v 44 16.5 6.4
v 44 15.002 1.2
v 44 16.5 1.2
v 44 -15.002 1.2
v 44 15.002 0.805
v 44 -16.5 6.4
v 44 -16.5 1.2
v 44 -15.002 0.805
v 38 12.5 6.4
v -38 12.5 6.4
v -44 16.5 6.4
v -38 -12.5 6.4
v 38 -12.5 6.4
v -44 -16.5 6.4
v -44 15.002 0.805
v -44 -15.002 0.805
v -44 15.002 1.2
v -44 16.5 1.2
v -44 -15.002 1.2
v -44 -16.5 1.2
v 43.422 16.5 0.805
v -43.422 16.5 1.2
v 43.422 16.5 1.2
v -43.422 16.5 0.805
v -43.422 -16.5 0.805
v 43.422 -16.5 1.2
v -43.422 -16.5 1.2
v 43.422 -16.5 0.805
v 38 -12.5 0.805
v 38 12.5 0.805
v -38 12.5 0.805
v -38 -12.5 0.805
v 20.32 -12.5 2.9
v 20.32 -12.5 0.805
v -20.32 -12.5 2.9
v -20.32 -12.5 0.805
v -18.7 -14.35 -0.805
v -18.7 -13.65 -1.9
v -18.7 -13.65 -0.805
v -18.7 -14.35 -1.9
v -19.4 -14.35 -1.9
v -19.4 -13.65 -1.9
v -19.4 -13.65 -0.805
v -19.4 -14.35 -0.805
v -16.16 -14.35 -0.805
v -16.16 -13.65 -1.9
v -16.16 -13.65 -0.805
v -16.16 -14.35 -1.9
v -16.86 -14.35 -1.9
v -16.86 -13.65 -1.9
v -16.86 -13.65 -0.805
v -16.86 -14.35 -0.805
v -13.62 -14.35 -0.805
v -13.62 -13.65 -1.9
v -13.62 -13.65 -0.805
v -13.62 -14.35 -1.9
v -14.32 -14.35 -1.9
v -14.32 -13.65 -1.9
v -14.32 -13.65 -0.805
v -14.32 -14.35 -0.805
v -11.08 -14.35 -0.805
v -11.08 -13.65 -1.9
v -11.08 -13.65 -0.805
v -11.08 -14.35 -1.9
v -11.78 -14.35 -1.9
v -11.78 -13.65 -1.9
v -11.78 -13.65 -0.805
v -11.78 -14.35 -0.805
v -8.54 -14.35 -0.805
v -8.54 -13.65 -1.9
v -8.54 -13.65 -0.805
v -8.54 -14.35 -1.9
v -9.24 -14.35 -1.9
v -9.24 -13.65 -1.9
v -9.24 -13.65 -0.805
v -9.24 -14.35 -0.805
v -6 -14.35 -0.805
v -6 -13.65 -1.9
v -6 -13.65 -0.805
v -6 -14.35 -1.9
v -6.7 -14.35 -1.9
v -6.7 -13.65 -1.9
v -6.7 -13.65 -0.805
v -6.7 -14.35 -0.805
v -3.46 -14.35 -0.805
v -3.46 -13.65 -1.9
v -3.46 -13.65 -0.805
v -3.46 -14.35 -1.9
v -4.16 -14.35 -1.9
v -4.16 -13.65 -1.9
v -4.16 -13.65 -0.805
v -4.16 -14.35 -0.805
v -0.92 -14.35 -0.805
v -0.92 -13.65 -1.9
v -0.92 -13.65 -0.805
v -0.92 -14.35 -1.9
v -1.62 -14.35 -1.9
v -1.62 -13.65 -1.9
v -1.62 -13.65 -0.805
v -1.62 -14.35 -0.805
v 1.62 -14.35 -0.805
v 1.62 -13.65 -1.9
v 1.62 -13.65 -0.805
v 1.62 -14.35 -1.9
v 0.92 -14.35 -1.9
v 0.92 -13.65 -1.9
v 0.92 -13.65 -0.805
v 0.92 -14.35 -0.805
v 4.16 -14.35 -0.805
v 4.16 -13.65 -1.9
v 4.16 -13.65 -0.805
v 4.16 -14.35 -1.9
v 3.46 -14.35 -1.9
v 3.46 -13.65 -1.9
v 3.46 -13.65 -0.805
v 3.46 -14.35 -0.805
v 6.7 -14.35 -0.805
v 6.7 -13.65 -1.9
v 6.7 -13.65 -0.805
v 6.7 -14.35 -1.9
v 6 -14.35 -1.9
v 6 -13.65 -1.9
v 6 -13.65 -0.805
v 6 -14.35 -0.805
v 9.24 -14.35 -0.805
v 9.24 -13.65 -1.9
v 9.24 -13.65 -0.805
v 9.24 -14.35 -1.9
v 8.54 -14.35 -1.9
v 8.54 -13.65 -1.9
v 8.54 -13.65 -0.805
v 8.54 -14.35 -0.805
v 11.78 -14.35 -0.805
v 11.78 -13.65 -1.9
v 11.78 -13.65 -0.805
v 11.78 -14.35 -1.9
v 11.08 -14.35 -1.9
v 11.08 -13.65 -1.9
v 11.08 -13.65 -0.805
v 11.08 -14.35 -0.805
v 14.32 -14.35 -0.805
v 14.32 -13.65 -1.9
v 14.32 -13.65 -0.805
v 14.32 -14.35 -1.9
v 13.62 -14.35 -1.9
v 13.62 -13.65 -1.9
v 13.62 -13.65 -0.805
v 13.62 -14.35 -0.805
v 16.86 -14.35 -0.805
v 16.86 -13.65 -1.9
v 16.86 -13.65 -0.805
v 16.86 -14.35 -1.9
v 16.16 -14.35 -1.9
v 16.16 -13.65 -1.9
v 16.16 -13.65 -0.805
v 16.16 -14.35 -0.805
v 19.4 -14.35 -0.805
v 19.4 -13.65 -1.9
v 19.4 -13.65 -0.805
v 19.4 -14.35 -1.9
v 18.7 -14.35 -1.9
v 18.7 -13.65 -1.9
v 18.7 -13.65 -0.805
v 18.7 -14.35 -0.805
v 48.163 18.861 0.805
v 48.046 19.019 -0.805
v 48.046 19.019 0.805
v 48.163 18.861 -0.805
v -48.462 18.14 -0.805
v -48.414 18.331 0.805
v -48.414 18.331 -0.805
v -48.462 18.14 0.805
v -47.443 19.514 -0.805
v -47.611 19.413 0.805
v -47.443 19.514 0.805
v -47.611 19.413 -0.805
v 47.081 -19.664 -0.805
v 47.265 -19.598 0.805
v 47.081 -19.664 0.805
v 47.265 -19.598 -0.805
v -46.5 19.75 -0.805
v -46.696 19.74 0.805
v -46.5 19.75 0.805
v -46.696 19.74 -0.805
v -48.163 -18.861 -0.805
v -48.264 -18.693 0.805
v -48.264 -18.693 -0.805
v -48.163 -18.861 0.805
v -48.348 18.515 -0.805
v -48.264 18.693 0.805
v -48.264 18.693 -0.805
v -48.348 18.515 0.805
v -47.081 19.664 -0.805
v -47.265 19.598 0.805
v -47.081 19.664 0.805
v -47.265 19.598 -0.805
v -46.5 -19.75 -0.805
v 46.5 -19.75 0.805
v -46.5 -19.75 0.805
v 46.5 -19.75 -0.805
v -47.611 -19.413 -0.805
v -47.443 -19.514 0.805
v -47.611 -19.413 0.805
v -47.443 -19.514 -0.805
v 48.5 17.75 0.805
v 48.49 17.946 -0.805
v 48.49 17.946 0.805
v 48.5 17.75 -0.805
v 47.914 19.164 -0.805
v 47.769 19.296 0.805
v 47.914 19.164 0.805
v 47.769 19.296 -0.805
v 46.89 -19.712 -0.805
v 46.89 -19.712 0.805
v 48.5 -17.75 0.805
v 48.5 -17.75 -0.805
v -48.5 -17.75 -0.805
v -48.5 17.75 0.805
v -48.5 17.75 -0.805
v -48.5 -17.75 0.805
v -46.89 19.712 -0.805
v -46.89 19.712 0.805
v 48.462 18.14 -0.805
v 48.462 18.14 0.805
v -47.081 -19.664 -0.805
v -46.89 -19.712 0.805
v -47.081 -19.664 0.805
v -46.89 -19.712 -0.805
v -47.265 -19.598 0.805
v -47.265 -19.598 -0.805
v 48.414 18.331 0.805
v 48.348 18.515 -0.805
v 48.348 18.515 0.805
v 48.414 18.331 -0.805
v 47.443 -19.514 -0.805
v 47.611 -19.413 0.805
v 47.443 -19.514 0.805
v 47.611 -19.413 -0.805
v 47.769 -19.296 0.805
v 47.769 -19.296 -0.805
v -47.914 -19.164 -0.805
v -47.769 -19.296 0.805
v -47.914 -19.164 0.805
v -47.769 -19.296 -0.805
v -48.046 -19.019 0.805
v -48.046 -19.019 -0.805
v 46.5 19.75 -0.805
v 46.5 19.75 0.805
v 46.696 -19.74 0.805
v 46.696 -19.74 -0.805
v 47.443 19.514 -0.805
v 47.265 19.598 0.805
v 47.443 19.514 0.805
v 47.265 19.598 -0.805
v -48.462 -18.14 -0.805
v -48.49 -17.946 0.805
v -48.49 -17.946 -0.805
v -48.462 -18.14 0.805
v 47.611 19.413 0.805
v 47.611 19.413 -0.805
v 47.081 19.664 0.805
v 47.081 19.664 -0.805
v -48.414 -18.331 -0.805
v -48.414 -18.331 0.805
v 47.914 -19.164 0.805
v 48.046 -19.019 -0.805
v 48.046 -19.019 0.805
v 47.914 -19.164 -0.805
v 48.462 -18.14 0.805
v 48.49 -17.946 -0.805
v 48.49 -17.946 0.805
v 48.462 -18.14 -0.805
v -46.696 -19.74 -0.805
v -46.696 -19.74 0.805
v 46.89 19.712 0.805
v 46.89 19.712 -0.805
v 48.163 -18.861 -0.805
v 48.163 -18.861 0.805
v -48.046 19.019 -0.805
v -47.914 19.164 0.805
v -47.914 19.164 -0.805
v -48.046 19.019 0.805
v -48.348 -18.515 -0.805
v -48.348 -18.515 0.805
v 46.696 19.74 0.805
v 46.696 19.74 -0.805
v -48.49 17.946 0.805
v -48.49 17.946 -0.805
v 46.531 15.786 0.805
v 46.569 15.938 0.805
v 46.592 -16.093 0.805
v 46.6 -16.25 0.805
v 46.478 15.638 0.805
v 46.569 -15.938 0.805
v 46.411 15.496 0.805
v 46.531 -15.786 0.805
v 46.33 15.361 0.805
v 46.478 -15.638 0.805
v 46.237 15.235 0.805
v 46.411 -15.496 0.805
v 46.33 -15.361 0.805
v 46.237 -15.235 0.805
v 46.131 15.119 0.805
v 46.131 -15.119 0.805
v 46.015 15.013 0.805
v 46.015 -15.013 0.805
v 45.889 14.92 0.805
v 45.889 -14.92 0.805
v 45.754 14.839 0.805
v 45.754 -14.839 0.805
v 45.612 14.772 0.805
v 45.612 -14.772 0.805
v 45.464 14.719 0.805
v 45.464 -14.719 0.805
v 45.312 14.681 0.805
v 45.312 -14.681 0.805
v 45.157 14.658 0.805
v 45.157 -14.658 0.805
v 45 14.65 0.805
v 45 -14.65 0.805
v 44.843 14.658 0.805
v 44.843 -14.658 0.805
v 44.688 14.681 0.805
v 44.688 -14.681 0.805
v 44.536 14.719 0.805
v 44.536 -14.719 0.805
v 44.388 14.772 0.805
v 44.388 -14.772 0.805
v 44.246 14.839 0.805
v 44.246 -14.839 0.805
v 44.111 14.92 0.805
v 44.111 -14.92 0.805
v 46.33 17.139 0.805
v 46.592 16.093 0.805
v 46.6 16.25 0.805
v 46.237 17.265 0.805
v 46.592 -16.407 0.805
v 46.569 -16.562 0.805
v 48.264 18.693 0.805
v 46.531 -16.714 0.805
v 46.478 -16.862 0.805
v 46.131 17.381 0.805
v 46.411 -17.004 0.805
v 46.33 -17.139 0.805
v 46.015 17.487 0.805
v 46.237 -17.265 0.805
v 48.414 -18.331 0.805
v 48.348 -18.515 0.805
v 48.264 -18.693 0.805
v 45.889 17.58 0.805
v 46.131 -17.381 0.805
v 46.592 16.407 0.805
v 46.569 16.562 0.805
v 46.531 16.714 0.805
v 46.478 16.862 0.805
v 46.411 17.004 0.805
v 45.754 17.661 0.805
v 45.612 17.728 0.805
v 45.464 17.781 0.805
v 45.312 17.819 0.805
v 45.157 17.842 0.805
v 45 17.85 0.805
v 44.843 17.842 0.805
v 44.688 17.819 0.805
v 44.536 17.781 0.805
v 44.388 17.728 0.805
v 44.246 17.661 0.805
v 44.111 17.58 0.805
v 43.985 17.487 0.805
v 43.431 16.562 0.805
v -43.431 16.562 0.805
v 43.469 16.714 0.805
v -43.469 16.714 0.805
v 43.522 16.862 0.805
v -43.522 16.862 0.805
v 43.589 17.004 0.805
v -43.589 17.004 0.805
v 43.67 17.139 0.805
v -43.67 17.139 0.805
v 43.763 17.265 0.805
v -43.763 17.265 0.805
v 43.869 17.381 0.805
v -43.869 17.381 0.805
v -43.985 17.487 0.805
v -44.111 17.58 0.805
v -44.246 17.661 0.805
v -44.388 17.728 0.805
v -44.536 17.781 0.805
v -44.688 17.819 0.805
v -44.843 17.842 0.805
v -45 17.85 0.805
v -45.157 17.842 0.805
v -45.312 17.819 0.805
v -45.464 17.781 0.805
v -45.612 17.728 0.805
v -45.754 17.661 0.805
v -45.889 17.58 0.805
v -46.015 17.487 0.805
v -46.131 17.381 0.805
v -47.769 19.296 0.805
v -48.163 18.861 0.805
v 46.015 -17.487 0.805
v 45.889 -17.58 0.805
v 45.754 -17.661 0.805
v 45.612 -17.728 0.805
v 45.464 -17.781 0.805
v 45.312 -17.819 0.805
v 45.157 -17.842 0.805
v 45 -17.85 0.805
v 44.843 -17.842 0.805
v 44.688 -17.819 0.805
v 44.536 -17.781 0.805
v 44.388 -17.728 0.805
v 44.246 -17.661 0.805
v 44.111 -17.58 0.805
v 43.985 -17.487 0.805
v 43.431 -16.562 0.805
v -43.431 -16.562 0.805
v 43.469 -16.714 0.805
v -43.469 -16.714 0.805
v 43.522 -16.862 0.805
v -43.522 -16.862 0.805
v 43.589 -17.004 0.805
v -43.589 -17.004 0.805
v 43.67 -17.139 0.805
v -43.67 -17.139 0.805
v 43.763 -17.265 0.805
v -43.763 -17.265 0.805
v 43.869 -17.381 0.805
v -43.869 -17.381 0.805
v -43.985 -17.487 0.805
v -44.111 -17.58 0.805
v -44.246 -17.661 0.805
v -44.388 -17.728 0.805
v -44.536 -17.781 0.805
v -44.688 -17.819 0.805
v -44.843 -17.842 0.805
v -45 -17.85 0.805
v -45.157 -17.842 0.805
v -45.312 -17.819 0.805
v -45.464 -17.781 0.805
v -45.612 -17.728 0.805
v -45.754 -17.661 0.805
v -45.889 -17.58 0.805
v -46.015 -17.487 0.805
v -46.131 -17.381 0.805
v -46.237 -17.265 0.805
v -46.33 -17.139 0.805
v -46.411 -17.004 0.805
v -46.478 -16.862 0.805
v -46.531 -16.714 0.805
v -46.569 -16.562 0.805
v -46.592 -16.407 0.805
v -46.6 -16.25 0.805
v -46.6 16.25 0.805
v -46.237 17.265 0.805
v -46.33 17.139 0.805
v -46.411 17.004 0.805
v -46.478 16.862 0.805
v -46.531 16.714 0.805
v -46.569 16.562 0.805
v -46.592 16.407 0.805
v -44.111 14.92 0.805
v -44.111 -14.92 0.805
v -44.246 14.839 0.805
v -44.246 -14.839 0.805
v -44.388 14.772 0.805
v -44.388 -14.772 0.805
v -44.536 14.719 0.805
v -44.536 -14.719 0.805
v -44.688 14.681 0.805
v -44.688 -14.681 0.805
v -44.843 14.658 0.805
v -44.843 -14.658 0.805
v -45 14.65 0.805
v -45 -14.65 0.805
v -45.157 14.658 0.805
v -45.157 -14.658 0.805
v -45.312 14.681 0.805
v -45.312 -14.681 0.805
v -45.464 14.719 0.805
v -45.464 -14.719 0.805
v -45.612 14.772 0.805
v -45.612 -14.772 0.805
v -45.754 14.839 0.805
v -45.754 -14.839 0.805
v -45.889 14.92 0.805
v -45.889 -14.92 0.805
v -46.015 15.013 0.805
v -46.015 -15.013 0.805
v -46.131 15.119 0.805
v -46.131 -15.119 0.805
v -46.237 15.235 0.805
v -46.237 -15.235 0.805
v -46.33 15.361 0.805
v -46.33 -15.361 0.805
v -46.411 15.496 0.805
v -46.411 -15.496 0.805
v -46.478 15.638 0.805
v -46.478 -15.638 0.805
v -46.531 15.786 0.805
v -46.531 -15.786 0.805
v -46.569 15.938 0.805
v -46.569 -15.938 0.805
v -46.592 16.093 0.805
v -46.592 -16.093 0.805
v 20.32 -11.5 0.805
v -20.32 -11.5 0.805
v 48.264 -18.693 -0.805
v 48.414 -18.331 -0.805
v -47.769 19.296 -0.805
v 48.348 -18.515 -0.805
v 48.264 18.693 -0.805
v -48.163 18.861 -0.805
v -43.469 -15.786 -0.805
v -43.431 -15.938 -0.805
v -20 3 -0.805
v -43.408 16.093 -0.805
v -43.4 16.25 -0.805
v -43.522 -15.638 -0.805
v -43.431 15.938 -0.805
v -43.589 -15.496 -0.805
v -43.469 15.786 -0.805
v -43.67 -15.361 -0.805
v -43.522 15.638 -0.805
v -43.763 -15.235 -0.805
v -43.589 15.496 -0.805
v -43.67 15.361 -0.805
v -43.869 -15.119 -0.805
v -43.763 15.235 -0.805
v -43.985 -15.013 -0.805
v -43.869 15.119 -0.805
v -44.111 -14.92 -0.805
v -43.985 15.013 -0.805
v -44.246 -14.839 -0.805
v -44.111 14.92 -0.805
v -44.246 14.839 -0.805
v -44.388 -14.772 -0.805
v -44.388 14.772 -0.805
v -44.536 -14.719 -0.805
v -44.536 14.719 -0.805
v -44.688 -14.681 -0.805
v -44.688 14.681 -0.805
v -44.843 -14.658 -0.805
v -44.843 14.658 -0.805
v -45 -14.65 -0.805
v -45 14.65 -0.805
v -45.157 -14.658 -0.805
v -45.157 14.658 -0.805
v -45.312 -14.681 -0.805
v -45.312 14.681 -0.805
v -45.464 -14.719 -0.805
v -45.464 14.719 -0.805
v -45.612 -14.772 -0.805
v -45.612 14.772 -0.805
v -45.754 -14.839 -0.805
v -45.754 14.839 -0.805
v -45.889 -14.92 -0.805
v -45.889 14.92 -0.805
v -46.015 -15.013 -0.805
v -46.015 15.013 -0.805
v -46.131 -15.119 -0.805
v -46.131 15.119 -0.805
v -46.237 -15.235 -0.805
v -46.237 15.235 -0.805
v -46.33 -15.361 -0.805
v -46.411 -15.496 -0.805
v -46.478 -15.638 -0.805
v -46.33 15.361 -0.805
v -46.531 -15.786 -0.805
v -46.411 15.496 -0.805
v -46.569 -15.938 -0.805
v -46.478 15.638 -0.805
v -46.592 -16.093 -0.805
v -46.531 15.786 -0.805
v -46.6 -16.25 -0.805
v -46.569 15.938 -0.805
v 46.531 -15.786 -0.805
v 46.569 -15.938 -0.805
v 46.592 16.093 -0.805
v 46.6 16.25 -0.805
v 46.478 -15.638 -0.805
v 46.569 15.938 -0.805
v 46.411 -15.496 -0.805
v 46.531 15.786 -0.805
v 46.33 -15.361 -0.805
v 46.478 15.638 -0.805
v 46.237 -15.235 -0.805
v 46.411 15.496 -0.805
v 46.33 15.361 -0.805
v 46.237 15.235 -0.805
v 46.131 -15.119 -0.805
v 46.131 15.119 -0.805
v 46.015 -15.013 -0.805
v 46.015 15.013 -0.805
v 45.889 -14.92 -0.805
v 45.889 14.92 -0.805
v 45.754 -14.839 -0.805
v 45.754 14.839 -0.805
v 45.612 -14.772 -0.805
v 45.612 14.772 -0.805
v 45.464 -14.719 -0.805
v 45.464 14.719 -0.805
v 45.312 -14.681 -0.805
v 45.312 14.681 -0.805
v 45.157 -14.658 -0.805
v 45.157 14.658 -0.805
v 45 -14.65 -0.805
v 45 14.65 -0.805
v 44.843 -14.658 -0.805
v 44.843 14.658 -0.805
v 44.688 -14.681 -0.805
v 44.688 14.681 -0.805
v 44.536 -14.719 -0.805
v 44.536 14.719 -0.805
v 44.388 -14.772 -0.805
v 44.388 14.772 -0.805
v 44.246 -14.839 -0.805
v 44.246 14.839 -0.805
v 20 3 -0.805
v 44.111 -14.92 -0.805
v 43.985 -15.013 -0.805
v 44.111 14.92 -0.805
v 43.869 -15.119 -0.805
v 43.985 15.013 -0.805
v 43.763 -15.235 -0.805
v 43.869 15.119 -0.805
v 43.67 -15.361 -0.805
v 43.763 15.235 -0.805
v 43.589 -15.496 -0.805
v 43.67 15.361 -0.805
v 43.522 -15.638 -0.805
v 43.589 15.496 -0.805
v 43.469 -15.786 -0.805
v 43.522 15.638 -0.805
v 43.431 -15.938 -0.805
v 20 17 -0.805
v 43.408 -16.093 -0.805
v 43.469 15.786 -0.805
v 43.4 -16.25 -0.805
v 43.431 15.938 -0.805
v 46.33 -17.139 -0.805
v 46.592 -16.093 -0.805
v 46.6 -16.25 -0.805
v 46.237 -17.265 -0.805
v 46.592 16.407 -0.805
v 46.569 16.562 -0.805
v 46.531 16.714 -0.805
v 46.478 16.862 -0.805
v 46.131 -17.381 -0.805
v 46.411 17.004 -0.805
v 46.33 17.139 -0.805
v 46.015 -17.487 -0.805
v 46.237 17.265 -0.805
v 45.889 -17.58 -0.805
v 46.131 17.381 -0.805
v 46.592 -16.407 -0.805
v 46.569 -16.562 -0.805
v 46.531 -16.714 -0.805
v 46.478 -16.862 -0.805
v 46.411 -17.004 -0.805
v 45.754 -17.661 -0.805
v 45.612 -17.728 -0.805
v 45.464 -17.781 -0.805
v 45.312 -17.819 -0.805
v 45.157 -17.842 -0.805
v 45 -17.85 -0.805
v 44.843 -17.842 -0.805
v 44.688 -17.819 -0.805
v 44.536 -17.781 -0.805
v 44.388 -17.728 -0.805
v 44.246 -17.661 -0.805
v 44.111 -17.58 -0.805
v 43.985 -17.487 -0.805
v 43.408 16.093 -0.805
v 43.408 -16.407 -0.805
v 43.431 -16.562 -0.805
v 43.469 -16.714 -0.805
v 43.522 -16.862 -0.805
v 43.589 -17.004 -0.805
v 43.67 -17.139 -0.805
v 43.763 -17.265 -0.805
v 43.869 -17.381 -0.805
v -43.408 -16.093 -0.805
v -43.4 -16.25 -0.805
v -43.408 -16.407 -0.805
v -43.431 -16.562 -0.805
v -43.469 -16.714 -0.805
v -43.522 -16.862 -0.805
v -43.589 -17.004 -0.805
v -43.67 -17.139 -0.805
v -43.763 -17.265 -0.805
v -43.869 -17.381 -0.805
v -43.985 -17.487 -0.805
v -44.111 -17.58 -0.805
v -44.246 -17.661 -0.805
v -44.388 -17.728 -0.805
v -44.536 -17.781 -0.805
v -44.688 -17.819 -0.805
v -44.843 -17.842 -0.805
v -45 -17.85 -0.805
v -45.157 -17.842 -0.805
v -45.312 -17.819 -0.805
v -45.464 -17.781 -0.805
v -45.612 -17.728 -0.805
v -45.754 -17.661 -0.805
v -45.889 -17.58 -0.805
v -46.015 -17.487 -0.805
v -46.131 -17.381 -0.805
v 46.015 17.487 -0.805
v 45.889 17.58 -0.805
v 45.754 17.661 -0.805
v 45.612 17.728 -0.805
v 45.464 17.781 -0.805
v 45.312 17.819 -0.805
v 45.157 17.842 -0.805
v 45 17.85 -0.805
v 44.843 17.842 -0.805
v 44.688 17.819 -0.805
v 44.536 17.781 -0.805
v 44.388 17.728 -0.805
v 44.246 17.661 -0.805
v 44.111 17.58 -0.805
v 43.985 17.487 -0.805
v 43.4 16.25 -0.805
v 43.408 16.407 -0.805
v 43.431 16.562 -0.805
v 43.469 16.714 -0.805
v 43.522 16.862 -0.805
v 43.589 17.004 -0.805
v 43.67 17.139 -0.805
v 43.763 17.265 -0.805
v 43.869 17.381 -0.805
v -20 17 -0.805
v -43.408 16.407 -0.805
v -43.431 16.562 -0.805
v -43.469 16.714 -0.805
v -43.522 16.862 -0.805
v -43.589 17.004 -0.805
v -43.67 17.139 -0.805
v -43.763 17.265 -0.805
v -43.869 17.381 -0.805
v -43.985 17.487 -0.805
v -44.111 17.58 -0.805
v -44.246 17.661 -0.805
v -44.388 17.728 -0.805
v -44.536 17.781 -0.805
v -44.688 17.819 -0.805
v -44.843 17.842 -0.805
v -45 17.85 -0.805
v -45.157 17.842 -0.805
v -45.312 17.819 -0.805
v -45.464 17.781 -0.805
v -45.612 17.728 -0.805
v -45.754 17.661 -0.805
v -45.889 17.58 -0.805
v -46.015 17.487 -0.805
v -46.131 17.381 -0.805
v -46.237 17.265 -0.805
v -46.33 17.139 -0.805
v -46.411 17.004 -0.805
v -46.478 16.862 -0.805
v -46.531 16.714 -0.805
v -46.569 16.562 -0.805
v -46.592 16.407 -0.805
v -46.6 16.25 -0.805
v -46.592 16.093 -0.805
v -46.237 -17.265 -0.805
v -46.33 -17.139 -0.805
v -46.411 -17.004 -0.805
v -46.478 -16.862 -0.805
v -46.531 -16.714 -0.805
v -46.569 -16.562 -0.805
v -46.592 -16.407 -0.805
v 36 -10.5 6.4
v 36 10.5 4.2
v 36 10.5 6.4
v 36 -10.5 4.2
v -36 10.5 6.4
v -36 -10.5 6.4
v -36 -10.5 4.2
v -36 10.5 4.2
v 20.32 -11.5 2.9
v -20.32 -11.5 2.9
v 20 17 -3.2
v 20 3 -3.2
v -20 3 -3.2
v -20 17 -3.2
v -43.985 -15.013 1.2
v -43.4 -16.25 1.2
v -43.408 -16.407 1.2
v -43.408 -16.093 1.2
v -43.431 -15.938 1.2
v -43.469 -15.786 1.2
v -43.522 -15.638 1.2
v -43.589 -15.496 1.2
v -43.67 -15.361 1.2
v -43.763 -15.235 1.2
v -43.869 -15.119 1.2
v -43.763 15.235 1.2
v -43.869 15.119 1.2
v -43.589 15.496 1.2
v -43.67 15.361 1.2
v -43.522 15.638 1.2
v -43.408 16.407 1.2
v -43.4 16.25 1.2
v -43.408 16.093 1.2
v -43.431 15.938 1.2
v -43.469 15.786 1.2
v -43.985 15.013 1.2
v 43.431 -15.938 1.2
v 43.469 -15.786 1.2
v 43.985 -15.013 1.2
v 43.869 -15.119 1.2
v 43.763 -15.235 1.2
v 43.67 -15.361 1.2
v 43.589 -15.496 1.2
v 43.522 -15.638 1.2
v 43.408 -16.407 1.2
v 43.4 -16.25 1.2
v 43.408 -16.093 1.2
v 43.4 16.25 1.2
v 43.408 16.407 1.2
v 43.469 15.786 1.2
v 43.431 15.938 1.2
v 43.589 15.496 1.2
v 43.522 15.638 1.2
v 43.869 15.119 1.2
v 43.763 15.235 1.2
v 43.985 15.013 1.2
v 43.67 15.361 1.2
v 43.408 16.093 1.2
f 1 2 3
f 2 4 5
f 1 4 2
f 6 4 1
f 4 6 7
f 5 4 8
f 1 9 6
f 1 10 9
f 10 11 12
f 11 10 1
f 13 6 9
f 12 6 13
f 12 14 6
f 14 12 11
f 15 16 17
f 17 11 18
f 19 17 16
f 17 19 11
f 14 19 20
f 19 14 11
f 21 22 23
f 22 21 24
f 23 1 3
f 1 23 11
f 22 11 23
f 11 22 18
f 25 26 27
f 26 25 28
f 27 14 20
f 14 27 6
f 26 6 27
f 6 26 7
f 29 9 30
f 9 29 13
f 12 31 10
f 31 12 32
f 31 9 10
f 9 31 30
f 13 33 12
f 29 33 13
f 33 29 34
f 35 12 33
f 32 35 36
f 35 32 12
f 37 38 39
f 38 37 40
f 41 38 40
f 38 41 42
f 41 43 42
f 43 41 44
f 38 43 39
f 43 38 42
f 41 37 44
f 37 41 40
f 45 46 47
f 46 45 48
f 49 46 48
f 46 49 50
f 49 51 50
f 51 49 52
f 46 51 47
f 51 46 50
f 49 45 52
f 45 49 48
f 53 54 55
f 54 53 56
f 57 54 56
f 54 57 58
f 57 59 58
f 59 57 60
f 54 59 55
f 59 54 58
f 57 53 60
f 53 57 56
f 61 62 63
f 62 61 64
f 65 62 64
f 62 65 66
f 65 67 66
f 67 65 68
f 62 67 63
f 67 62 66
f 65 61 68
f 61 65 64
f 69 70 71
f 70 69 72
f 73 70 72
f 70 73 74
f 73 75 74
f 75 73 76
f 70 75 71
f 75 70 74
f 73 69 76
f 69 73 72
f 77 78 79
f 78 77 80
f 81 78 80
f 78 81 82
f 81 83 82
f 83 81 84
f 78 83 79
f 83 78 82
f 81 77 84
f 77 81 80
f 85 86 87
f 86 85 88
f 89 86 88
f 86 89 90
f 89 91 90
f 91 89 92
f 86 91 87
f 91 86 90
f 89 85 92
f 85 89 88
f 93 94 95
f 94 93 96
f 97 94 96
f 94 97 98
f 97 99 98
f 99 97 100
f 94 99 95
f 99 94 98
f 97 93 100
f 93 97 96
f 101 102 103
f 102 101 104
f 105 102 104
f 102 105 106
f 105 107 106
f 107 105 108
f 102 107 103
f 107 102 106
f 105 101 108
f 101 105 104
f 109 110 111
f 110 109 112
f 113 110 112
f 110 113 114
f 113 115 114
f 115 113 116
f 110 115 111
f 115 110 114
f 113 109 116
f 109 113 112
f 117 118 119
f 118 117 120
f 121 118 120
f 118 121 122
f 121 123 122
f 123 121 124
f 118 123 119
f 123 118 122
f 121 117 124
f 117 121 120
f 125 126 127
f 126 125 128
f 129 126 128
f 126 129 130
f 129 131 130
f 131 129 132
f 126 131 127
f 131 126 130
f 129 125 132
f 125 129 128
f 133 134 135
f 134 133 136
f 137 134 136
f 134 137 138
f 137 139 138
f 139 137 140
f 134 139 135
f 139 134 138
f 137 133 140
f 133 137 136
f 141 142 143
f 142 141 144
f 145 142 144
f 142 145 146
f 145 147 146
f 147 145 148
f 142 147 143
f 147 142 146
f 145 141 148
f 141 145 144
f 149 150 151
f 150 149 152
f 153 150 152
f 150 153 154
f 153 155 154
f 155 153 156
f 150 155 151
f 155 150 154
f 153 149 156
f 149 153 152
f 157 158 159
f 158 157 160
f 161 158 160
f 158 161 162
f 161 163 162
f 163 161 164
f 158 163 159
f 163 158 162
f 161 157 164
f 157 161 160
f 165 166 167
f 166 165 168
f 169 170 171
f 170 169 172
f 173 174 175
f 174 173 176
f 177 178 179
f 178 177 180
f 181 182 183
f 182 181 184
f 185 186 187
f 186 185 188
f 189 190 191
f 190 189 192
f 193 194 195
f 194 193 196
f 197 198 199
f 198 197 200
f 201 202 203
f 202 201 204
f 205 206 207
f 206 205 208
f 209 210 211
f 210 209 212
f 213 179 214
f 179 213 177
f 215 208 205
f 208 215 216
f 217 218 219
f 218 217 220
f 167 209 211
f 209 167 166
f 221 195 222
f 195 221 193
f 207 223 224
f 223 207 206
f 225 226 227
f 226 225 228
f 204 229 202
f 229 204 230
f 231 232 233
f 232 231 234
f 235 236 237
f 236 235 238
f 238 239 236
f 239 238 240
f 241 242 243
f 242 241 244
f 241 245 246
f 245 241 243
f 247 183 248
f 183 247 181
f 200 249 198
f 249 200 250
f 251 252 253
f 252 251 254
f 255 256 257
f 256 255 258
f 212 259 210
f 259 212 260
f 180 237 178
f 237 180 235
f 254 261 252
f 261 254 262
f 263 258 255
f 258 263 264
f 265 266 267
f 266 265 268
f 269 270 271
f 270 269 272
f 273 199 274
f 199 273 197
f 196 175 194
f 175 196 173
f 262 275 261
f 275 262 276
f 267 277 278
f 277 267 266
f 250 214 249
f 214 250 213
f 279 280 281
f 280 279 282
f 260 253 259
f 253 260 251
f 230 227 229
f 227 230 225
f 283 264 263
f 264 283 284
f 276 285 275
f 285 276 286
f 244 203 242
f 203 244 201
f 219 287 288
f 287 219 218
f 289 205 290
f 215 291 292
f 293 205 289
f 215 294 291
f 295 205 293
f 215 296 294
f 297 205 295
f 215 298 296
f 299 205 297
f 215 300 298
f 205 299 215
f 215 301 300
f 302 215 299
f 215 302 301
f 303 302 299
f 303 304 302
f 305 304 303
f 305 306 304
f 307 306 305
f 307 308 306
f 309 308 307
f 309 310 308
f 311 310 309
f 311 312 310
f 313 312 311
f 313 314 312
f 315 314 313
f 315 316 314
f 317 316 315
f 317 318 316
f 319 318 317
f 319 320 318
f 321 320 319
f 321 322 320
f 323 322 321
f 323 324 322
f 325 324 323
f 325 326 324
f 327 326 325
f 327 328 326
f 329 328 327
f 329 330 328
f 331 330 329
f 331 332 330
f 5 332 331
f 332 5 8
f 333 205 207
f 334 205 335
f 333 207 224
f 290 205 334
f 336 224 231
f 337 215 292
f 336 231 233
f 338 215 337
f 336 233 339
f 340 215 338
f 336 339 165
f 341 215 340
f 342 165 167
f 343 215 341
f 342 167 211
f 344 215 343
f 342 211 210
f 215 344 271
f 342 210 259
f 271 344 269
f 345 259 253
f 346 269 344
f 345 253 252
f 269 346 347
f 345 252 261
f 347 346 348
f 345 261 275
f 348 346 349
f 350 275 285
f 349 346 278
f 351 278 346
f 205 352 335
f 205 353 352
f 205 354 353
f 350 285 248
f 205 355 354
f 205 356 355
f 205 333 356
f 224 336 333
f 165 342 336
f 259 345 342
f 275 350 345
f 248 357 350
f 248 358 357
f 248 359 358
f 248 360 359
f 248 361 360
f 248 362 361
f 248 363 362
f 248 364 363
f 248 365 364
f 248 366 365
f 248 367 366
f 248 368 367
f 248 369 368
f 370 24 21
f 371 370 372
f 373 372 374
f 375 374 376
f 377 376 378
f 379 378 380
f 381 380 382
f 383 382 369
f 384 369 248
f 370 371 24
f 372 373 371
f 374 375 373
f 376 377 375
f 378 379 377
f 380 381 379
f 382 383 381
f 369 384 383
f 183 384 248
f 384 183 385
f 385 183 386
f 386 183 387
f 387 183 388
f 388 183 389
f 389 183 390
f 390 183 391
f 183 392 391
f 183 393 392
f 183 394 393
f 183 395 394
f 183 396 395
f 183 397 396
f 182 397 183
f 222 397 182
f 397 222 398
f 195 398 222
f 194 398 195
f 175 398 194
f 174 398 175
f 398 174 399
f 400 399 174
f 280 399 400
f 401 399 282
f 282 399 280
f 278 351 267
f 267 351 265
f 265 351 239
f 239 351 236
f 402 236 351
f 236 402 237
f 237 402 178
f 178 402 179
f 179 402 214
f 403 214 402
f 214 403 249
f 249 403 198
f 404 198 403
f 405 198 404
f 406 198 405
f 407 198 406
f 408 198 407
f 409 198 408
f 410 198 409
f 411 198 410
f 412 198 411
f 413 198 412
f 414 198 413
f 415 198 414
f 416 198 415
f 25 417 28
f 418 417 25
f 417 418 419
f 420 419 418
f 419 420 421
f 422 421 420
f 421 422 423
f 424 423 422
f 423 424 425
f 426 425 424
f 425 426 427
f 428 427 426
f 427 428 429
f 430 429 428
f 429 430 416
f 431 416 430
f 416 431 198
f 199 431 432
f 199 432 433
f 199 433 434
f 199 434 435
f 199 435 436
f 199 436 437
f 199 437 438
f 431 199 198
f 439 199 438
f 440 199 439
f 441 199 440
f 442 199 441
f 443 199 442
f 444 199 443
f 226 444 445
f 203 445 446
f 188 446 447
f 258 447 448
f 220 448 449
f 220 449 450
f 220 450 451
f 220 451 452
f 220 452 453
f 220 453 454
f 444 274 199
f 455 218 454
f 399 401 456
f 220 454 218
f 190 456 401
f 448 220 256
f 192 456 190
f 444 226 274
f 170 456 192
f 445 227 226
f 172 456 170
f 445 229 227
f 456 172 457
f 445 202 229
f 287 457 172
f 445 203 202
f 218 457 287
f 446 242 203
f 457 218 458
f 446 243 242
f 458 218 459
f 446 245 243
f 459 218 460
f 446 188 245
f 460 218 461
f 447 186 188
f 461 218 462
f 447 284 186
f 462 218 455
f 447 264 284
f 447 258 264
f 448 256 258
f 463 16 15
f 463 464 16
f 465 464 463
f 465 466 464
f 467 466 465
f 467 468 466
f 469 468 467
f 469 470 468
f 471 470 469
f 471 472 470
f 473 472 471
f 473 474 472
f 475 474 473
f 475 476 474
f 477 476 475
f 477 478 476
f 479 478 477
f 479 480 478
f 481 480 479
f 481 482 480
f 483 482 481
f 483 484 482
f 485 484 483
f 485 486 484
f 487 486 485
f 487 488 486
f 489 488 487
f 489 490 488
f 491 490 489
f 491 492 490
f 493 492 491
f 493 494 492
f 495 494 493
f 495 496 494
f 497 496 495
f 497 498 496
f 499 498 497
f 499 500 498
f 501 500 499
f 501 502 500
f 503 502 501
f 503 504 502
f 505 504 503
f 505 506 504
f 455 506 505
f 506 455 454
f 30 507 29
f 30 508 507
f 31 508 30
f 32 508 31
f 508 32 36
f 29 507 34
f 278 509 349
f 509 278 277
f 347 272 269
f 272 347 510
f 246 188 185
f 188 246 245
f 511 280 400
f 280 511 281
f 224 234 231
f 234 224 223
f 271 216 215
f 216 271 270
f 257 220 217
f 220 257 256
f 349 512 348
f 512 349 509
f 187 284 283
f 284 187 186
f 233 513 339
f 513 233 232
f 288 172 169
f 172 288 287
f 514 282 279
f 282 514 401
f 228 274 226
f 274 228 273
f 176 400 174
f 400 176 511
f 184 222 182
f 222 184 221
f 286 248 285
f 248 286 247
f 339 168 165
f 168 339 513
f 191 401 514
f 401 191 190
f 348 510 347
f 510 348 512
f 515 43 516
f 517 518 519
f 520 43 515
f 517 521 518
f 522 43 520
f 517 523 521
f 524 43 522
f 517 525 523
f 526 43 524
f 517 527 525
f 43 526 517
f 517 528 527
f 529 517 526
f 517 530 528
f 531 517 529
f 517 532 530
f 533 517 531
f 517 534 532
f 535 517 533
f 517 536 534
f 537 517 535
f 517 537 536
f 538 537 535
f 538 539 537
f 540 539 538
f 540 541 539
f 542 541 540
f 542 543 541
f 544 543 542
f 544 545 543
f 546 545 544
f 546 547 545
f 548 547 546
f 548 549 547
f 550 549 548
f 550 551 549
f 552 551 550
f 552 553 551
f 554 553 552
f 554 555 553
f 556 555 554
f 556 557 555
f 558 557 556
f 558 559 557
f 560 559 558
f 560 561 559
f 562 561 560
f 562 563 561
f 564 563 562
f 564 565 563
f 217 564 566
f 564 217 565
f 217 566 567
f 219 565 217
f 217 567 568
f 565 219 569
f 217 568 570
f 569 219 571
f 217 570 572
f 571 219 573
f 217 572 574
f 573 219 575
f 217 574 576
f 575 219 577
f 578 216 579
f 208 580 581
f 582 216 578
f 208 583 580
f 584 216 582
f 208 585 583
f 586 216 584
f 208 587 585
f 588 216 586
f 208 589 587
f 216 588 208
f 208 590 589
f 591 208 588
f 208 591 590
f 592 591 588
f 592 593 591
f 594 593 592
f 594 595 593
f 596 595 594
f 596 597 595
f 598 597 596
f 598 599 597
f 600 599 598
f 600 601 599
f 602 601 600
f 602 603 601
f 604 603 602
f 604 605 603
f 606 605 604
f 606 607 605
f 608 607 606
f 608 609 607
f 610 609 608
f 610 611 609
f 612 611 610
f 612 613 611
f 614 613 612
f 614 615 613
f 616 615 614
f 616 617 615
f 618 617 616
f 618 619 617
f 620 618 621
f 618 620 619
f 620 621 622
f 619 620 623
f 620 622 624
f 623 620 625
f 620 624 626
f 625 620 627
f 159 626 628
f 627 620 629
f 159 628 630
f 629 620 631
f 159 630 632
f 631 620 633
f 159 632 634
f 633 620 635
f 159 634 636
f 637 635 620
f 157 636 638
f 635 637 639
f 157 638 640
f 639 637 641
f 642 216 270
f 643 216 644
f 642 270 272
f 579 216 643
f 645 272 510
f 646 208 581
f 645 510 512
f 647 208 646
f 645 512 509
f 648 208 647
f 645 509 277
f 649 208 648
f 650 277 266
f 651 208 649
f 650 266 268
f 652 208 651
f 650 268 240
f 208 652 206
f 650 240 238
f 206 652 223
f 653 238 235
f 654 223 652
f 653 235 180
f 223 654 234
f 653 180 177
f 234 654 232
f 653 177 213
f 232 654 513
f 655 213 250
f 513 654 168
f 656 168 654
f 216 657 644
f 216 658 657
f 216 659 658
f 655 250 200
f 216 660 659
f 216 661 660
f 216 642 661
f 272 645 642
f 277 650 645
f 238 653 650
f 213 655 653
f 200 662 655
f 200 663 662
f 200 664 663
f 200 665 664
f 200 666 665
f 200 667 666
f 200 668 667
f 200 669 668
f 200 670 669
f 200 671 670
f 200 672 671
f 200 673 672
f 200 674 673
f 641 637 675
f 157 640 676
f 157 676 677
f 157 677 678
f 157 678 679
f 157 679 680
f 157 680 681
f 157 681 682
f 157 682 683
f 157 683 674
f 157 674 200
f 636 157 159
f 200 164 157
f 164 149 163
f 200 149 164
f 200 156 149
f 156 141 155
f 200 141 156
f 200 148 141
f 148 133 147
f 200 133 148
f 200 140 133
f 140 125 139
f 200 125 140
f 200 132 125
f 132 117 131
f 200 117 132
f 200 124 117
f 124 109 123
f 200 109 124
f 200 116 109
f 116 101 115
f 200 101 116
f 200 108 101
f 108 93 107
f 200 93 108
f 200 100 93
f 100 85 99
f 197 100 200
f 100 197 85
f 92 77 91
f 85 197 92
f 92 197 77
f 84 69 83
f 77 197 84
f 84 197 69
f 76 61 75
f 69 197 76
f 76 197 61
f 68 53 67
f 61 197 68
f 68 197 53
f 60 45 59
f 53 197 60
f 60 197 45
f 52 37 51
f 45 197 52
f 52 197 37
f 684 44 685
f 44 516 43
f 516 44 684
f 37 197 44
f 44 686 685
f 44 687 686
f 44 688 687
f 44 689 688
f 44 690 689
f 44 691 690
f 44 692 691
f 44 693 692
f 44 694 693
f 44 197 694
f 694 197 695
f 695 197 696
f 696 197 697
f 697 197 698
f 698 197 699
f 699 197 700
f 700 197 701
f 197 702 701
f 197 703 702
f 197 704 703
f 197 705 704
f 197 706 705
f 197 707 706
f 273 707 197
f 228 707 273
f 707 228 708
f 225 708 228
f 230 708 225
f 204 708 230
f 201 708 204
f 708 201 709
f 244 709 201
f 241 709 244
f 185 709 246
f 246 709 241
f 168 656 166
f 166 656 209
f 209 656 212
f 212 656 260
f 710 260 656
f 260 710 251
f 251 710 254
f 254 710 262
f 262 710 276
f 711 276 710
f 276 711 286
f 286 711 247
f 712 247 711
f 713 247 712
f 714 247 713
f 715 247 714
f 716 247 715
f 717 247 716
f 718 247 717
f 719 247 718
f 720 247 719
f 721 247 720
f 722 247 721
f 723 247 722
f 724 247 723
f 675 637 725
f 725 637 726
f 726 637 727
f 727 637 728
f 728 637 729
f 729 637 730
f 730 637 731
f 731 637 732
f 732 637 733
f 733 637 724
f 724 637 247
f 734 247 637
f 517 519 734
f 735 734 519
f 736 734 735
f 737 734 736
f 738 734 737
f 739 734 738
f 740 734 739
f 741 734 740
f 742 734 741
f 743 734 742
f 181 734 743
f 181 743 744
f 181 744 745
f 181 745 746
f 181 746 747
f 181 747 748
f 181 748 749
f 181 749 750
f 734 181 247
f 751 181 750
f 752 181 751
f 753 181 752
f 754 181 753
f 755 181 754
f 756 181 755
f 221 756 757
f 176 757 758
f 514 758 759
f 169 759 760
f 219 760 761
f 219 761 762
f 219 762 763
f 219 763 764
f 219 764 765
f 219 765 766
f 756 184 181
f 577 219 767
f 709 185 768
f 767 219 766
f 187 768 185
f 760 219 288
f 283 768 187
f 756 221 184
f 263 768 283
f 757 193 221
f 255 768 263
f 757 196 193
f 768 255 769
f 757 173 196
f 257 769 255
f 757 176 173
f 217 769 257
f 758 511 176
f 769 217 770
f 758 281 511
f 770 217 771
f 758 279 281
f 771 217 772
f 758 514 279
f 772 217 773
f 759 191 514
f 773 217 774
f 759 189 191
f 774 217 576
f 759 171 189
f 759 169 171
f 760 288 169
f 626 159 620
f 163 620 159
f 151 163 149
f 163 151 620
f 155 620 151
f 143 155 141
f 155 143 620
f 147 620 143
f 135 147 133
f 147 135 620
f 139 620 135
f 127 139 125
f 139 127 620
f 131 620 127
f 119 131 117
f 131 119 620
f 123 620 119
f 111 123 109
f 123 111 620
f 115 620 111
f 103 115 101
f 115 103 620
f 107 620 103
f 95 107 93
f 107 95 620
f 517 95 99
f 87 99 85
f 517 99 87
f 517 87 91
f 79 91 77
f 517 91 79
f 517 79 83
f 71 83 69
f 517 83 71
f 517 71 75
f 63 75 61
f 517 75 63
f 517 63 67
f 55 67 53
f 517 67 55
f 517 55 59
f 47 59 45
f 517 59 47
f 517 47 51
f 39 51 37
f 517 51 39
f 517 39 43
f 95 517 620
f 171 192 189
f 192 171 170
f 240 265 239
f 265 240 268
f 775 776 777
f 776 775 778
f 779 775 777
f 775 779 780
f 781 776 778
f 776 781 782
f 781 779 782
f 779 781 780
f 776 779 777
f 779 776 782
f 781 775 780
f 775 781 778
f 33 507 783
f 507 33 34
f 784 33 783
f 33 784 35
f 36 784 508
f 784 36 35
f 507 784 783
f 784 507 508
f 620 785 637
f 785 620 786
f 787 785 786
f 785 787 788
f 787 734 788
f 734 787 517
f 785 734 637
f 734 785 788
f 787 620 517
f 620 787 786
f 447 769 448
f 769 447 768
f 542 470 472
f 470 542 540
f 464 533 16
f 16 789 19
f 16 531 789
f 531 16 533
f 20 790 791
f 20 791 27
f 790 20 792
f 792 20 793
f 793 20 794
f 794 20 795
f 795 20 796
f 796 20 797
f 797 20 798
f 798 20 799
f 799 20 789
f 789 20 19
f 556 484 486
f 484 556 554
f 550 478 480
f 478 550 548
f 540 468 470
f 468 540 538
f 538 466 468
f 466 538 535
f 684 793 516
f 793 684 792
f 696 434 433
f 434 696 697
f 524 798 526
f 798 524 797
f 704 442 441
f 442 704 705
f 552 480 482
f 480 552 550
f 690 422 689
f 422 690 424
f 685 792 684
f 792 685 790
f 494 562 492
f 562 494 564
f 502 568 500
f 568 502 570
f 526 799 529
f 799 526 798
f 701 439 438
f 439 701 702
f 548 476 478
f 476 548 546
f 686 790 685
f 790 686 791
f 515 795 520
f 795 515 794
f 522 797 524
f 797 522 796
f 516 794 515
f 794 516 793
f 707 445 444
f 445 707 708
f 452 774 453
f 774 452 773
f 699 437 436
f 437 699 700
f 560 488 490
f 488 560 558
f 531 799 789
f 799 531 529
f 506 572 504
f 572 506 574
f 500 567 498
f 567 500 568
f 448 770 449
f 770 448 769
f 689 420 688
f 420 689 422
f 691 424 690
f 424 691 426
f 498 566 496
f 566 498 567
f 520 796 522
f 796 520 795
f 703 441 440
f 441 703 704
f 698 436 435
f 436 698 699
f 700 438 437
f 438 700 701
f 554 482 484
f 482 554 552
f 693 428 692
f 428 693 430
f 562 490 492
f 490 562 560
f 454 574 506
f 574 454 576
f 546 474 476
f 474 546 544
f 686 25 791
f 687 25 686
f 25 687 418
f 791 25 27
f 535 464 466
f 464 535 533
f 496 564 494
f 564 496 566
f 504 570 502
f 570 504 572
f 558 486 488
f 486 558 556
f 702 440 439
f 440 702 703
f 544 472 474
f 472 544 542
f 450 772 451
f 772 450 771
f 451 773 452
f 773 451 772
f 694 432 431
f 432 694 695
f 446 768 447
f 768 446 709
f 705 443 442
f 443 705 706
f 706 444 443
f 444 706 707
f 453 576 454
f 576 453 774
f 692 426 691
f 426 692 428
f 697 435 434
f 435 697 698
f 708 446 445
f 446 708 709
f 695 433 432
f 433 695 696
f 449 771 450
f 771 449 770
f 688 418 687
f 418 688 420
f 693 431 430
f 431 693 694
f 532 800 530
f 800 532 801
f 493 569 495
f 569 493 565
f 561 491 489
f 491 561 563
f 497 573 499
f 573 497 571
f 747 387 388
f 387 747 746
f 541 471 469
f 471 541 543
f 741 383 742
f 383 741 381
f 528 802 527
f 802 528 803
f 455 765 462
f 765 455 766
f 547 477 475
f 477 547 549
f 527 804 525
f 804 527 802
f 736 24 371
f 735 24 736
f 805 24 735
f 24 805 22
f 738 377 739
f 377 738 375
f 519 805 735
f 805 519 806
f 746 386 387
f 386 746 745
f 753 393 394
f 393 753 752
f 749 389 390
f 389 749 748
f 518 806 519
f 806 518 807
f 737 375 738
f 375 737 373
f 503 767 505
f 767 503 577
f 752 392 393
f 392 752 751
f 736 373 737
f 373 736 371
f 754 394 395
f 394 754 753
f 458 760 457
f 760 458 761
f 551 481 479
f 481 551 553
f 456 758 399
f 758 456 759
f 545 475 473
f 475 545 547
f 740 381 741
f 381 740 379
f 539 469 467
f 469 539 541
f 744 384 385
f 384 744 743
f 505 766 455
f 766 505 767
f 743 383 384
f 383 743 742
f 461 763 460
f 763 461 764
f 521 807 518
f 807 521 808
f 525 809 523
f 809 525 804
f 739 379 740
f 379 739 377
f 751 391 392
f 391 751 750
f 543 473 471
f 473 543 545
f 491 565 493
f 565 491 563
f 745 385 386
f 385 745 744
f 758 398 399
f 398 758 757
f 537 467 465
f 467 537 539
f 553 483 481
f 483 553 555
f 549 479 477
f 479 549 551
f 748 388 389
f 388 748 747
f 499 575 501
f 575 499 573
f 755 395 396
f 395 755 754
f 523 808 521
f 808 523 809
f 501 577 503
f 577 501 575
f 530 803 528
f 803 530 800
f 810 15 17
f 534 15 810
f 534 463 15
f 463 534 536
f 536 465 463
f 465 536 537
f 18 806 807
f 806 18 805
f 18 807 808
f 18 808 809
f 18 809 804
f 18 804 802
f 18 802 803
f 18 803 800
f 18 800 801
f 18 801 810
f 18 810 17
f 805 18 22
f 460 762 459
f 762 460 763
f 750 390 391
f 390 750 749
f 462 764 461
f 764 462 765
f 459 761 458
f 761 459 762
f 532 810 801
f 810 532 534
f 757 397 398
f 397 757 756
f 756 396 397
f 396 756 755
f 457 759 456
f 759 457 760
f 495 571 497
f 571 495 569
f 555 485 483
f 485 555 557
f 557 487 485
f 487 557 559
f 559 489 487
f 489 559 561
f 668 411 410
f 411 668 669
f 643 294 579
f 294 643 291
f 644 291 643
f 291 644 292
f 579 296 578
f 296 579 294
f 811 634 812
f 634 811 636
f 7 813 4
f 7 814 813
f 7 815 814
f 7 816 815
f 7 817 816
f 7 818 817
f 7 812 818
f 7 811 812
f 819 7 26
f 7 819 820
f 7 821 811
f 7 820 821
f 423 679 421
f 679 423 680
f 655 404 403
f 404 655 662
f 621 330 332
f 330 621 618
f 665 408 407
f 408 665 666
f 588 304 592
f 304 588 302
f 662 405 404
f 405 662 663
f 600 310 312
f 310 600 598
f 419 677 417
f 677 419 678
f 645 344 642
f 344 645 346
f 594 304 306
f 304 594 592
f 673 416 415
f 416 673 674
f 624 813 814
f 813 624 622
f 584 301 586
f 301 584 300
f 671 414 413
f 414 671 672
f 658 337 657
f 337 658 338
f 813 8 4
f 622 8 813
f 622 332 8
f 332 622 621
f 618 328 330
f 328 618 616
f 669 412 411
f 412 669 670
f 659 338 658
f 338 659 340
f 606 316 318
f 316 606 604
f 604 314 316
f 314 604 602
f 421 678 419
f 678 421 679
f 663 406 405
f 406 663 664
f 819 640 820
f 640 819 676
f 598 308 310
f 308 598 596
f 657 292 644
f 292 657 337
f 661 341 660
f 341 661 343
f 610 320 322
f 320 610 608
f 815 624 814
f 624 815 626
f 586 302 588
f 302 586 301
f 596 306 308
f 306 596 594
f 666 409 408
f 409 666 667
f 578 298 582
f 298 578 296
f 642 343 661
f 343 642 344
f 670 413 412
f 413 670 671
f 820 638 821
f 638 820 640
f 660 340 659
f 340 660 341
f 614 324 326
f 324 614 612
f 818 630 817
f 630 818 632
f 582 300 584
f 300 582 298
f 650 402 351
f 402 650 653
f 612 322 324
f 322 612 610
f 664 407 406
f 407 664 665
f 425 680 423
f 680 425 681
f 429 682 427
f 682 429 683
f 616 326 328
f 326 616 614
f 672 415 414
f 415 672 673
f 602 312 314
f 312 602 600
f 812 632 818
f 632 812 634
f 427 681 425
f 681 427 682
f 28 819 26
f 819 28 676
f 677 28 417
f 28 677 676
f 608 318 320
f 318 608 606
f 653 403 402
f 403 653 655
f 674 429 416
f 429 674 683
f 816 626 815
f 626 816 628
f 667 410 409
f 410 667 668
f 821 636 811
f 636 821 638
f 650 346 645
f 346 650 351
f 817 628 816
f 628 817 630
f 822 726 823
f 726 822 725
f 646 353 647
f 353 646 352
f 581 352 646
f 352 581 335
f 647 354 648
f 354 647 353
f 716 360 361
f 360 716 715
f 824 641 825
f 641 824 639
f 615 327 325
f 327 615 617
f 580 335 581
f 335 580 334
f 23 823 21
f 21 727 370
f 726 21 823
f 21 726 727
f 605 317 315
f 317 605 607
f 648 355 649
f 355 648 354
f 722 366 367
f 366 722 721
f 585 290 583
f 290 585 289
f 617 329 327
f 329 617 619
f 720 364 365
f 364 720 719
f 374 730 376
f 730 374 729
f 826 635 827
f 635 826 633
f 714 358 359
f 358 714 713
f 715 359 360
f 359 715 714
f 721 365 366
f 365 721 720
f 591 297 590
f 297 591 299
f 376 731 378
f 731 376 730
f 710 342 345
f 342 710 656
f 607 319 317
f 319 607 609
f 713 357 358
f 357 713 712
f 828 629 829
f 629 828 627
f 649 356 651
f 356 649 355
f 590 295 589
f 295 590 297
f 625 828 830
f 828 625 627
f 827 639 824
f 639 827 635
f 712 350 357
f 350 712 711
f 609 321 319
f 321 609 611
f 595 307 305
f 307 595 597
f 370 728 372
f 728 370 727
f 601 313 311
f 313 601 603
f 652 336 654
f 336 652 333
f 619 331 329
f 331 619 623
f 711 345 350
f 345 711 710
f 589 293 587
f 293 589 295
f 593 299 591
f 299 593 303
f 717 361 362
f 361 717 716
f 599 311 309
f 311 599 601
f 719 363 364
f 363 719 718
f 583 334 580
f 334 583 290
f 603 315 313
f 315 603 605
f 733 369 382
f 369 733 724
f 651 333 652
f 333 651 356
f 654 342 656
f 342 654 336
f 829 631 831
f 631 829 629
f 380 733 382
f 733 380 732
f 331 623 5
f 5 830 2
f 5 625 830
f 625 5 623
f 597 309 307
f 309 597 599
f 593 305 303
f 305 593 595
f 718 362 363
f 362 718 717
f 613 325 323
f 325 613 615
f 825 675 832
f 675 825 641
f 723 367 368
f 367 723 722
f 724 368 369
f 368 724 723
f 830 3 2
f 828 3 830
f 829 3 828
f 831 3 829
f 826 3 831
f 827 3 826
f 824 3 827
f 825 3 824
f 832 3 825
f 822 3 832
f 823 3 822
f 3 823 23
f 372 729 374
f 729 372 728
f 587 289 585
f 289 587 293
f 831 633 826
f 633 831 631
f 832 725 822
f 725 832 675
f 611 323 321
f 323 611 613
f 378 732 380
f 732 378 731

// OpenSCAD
// LCD 2004A-style display module (single connected solid)
// Overall PCB: 97.0mm x 39.5mm

$fn = 64;

// -------------------- Parameters --------------------
pcb_L = 97.0;
pcb_W = 39.5;
pcb_T = 1.6;

corner_r = 2.0;

hole_d = 3.2;
hole_edge_margin_x = 3.5;
hole_edge_margin_y = 3.5;

window_L = 76.0;
window_W = 25.0;
window_offset_x = 0.0;
window_offset_y = 0.0;

// Bezel / front frame
bezel_T = 6.0;
bezel_margin_x = 6.0;
bezel_margin_y = 4.0;

// LCD glass / active area (raised detail)
glass_T = 2.2;
glass_margin = 2.0; // glass smaller than bezel opening

// Header pins (represented as a single connected block + pins)
pin_count = 16;
pin_pitch = 2.54;
pin_row_offset_x = 0.0;
pin_row_offset_y = -14.0;

header_body_L = (pin_count - 1) * pin_pitch + 2.54; // slight end margin
header_body_W = 5.0;
header_body_T = 2.5;

pin_w = 0.7;
pin_h = 6.0; // above header body
pin_embed = 1.2; // embed into header body for connectivity

// Backside controller "blob" (simple IC block)
ic_L = 40.0;
ic_W = 14.0;
ic_T = 2.8;
ic_offset_x = 0.0;
ic_offset_y = 10.0;

// Small overlap to guarantee unions are watertight
overlap = 0.4;

// -------------------- Helpers --------------------
module rounded_rect_prism(L, W, T, r) {
    // Minkowski rounded rectangle prism
    // Keep r sane
    rr = min(r, min(L, W)/2 - 0.01);
    minkowski() {
        cube([L - 2*rr, W - 2*rr, T], center=true);
        cylinder(r=rr, h=0.01, center=true);
    }
}

module mount_holes() {
    for (sx = [-1, 1], sy = [-1, 1]) {
        translate([sx*(pcb_L/2 - hole_edge_margin_x), sy*(pcb_W/2 - hole_edge_margin_y), 0])
            cylinder(d=hole_d, h=pcb_T + 2*overlap, center=true);
    }
}

module bezel_frame() {
    // Frame sits on top of PCB and is connected with slight overlap
    zc = pcb_T/2 + bezel_T/2 - overlap;
    translate([window_offset_x, window_offset_y, zc])
    difference() {
        cube([window_L + 2*bezel_margin_x, window_W + 2*bezel_margin_y, bezel_T], center=true);
        // Opening
        translate([0, 0, 0])
            cube([window_L, window_W, bezel_T + 2*overlap], center=true);
    }
}

module lcd_glass() {
    // Glass sits inside bezel opening, slightly raised, connected to bezel via overlap
    glass_L = window_L - 2*glass_margin;
    glass_W = window_W - 2*glass_margin;
    zc = pcb_T/2 + bezel_T - glass_T/2 - overlap; // overlaps into bezel
    translate([window_offset_x, window_offset_y, zc])
        cube([glass_L, glass_W, glass_T], center=true);
}

module header_body() {
    // Header body on top side of PCB near bottom edge
    zc = pcb_T/2 + header_body_T/2 - overlap;
    translate([pin_row_offset_x, pin_row_offset_y, zc])
        cube([header_body_L, header_body_W, header_body_T], center=true);
}

module header_pins() {
    // Pins protrude upward from header body; embedded for connectivity
    zc = pcb_T/2 + header_body_T - pin_h/2 + pin_embed - overlap;
    for (i = [0:pin_count-1]) {
        x = pin_row_offset_x - (pin_count-1)*pin_pitch/2 + i*pin_pitch;
        translate([x, pin_row_offset_y, zc])
            cube([pin_w, pin_w, pin_h], center=true);
    }
}

module backside_ic() {
    // Simple IC block on back side, connected to PCB with overlap
    zc = -pcb_T/2 - ic_T/2 + overlap;
    translate([ic_offset_x, ic_offset_y, zc])
        cube([ic_L, ic_W, ic_T], center=true);
}

// -------------------- Main Solid --------------------
module lcd2004a_module() {
    difference() {
        union() {
            // PCB (rounded corners)
            rounded_rect_prism(pcb_L, pcb_W, pcb_T, corner_r);

            // Bezel + glass (front details)
            bezel_frame();
            lcd_glass();

            // Header (body + pins)
            header_body();
            header_pins();

            // Backside controller block
            backside_ic();
        }

        // Mounting holes through PCB only (do not cut bezel/header)
        // Limit cut height to PCB thickness by centering at z=0
        mount_holes();
    }
}

lcd2004a_module();
